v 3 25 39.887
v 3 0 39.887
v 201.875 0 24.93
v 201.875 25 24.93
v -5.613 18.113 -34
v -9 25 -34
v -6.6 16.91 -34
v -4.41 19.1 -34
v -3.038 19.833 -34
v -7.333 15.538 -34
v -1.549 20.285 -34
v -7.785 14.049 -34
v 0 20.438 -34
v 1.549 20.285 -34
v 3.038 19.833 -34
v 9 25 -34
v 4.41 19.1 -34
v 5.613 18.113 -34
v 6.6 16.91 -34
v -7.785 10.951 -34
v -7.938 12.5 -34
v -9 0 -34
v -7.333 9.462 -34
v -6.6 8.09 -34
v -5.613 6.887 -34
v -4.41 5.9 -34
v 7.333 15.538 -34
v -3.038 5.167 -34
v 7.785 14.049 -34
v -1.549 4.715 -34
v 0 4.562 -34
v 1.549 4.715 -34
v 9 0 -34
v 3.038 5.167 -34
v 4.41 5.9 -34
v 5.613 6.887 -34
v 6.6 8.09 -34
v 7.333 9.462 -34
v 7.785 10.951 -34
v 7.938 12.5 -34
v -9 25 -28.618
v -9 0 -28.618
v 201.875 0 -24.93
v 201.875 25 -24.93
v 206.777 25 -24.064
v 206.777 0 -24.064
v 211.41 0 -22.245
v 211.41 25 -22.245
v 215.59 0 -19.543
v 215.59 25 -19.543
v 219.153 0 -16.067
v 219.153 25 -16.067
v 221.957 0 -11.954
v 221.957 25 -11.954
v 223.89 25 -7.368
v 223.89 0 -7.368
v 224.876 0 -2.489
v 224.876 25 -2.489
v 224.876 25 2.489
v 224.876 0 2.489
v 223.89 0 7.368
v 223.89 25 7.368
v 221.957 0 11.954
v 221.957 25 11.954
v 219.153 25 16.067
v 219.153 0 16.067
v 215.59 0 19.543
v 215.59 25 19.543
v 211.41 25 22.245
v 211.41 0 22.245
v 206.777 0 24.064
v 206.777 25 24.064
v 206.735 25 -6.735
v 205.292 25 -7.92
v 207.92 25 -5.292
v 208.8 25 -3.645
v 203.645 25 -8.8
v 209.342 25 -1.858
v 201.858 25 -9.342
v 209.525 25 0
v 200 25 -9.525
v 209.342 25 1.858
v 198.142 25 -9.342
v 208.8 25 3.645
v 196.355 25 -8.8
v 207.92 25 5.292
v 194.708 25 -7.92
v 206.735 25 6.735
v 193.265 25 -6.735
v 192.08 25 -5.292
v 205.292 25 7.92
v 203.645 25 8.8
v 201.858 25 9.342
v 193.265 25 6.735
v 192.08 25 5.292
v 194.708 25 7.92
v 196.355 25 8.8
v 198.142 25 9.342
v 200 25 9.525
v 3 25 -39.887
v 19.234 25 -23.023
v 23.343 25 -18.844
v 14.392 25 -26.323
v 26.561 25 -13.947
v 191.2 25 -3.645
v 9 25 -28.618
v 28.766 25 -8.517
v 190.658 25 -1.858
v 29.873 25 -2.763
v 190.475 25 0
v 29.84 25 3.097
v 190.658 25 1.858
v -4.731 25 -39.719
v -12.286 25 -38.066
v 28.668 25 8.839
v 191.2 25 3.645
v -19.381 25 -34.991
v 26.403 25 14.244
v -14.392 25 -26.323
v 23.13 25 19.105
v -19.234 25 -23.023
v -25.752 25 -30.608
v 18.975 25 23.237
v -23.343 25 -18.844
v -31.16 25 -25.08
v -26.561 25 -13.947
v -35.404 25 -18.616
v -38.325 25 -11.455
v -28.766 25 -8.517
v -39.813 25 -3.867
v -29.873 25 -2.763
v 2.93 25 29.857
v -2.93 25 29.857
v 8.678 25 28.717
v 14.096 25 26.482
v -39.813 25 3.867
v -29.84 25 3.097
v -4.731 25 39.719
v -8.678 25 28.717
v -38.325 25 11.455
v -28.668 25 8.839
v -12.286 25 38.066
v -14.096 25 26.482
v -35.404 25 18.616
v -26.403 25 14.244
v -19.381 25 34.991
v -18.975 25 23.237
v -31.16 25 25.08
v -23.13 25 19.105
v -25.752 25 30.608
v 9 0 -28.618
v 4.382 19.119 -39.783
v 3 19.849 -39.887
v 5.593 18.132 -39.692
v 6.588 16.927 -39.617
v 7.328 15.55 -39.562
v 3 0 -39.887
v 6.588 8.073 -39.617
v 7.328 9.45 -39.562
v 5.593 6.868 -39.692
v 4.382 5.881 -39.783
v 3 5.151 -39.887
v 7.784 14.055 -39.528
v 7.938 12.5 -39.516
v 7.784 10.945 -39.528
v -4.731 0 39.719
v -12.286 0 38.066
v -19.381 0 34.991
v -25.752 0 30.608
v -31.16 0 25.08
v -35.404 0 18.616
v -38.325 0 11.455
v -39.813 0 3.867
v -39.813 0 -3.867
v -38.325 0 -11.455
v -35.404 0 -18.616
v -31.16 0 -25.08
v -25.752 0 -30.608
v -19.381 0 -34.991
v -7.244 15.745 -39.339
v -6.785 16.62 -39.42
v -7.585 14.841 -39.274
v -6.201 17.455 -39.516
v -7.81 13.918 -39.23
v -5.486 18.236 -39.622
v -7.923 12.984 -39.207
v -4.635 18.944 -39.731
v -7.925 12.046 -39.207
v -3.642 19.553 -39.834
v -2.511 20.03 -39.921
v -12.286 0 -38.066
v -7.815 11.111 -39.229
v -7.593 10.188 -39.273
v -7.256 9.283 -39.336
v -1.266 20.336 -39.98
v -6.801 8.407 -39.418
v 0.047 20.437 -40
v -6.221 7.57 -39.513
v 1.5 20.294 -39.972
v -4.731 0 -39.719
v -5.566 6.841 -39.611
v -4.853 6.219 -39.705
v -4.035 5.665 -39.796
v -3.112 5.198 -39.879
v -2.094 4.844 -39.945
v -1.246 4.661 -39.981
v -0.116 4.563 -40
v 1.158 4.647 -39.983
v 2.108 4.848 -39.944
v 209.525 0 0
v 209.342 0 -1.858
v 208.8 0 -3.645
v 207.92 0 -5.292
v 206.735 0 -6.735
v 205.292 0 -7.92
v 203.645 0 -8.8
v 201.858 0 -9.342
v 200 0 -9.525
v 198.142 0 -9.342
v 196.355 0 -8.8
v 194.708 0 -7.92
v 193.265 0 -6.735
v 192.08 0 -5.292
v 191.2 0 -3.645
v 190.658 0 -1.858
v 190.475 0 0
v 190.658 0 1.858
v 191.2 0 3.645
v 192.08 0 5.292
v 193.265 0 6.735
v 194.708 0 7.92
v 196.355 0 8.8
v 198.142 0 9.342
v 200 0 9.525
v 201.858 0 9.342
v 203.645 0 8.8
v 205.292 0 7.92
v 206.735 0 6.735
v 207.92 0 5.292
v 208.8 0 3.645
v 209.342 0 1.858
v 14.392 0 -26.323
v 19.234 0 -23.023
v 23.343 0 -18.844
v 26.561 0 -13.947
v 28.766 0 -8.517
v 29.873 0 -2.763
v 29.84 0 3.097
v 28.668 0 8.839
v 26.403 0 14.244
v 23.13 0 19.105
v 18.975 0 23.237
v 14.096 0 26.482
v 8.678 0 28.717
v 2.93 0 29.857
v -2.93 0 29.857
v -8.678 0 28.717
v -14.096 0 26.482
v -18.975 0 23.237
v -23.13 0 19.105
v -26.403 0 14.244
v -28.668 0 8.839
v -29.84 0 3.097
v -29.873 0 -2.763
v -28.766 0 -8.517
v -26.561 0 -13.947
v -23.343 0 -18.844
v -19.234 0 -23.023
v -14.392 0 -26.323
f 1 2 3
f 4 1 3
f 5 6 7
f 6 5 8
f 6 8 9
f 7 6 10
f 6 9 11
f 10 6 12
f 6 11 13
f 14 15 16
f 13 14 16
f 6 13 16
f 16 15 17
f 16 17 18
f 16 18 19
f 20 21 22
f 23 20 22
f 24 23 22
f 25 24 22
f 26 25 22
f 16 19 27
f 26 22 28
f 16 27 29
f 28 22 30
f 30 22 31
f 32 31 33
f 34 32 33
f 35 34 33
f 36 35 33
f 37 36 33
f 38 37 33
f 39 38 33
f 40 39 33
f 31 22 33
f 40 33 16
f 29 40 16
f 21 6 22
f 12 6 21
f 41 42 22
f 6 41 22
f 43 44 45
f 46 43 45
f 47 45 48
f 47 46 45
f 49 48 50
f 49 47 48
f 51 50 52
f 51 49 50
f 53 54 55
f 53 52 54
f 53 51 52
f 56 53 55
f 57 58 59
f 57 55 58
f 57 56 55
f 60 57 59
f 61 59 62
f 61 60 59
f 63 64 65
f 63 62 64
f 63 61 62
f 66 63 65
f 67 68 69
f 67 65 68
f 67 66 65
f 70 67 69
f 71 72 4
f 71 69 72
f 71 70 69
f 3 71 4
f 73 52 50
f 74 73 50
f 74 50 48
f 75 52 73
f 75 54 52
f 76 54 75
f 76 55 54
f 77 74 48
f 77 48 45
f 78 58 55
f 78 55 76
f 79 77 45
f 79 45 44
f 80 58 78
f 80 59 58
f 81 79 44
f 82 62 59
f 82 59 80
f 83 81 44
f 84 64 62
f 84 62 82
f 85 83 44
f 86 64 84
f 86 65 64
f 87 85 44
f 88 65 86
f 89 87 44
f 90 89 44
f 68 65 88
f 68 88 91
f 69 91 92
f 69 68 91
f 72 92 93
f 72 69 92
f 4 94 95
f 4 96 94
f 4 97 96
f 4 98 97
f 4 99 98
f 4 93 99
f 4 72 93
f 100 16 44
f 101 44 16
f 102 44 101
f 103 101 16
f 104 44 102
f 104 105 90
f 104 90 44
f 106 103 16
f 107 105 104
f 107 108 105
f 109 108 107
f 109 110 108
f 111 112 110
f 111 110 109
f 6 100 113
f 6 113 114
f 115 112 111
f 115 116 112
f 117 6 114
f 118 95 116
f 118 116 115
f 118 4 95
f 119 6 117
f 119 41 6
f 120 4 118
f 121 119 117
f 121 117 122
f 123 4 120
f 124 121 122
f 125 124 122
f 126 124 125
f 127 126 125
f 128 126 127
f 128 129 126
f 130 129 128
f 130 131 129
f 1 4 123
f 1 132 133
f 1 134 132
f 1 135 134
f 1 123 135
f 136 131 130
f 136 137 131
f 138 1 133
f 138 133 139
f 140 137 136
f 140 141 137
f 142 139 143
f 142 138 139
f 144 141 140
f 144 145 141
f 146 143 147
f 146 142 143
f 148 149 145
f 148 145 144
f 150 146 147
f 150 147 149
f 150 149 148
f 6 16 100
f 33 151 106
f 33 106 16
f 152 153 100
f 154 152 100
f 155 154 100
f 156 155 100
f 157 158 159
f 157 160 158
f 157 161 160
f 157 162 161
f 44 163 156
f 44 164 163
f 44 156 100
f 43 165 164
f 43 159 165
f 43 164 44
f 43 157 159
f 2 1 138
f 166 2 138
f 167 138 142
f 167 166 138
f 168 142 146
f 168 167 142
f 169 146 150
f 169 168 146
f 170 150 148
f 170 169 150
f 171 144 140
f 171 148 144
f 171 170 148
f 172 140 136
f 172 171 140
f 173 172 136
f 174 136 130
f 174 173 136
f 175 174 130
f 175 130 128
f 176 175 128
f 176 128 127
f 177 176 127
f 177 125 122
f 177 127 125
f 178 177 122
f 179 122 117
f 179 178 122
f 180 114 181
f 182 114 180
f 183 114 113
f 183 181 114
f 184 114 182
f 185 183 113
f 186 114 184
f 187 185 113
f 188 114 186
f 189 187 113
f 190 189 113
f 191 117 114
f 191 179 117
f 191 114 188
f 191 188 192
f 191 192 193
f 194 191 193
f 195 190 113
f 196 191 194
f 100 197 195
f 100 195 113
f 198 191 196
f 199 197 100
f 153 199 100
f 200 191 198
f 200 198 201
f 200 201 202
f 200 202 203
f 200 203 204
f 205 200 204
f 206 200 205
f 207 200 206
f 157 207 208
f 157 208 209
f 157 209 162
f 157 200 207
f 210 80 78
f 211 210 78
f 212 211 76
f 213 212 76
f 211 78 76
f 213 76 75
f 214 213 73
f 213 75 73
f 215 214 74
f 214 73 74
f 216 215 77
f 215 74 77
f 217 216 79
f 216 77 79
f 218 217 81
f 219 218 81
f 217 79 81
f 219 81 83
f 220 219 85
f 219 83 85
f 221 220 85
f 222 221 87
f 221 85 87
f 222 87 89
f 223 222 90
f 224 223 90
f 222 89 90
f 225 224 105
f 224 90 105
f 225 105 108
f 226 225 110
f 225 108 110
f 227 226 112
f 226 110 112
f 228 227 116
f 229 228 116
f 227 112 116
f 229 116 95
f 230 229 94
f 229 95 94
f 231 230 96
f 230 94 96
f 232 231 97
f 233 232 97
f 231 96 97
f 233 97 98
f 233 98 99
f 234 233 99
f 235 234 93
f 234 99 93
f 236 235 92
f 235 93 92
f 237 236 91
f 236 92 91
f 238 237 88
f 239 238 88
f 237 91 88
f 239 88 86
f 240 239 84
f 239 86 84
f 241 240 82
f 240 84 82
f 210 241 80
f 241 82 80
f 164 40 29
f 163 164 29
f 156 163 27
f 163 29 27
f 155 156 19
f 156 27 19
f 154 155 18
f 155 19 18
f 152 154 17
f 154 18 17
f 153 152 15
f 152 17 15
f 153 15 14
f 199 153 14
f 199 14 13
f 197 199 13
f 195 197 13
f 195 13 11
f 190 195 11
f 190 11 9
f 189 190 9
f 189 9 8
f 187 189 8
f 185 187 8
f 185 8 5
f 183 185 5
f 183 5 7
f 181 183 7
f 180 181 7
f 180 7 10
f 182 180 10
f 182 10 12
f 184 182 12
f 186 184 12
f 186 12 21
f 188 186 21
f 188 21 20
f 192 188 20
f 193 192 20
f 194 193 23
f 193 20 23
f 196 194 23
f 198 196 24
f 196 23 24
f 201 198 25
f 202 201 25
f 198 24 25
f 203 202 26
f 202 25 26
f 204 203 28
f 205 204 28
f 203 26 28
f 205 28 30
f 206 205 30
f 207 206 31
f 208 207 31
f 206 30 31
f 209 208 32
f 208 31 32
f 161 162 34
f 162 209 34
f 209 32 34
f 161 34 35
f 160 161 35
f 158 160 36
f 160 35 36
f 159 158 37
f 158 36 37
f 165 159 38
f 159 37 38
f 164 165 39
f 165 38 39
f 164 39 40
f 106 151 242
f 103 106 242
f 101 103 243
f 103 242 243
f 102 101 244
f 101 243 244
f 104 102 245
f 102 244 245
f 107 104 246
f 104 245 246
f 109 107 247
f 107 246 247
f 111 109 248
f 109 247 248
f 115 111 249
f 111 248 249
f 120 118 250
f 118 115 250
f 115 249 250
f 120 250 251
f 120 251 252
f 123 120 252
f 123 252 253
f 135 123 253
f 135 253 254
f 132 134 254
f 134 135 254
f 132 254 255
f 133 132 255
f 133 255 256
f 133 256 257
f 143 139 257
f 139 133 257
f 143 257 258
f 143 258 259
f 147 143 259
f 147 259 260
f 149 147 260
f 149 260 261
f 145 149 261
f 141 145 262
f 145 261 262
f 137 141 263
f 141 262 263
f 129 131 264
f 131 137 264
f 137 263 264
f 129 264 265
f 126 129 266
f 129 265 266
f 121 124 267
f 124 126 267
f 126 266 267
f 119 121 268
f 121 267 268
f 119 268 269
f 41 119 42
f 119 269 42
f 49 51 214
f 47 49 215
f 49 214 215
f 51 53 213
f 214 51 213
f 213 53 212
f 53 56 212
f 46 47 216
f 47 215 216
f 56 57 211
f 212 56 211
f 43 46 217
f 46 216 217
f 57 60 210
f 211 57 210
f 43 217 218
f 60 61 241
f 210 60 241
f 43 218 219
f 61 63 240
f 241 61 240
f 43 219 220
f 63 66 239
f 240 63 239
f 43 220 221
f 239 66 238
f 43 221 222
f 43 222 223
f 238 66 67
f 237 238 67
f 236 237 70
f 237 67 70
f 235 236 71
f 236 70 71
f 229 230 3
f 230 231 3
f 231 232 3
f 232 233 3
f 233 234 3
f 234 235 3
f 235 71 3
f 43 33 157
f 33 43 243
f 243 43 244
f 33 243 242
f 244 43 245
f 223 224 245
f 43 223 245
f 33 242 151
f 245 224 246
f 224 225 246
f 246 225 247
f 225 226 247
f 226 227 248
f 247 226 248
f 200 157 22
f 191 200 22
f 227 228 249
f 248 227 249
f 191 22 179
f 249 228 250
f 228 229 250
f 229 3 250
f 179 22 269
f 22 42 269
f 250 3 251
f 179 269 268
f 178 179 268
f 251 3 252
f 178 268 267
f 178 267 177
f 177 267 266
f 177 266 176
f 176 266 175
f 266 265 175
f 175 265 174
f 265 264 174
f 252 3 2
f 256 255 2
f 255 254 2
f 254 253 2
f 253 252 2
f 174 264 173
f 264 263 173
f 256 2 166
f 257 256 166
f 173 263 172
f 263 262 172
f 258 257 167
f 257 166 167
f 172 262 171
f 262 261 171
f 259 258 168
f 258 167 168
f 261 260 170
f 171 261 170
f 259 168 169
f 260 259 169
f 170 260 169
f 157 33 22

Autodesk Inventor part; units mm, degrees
ref_plane "YZ Plane" through (0, 0, 0) normal (1, 0, 0) x (0, 1, 0)
ref_plane "XZ Plane" through (0, 0, 0) normal (0, 1, 0) x (-1, 0, 0)
ref_plane "XY Plane" through (0, 0, 0) normal (0, 0, 1) x (1, 0, 0)
sketch "Sketch1" plane through (0, 0, 0) normal (0, 1, 0) x (-1, 0, 0)
  arc A0 (9, -28.6182) -> (-9, -28.6182) centre (0, 0) ccw
  arc A1 (-3, 39.8873) -> (-3, -39.8873) centre (0, 0) ccw construction
  line L0 (0, 0) -> (-200, 0) construction
  arc A2 (-175, 0) -> (-200, 25) centre (-200, 0) ccw construction
  line L1 (-200, 25) -> (-200, -25) construction
  line L2 (-3, -39.8873) -> (-201.875, -24.9296)
  line L3 (-3, 39.8873) -> (-201.875, 24.9296)
  arc A3 (-3, -39.8873) -> (-3, 39.8873) centre (0, 0) ccw
  arc A4 (-200, -25) -> (-175, 0) centre (-200, 0) ccw construction
  arc A5 (-200, 25) -> (-200, -25) centre (-200, 0) ccw
  line L4 (0, 0) -> (0, -30) construction
  line L5 (9, -23) -> (-9, -23) construction
  line L6 (9, -23) -> (9, -28.6182) construction
  line L7 (-9, -23) -> (-9, -28.6182) construction
  line L8 (9, -28.6182) -> (9, -34)
  line L9 (-9, -28.6182) -> (-9, -34)
  line L10 (9, -34) -> (-9, -34)
  arc A6 (0, -30) -> (9, -28.6182) centre (0, 0) ccw construction
  arc A7 (-9, -28.6182) -> (0, -30) centre (0, 0) ccw construction
  dimension "d0" = 60
  dimension "d1" = 80
  dimension "d2" = 200
  dimension "d3" = 50
  dimension "d5" = 18
  dimension "d6" = 7
  dimension "d7" = 4
extrude "Extrusion1" add sketch "Sketch1" along normal blind 25
sketch "Sketch2" plane through (0, 25, 0) normal (0, 1, 0) x (1, 0, 0)
  arc A0 (201.875, -24.9296) -> (201.875, 24.9296) centre (200, 0) ccw projected
  circle A1 centre (200, 0) radius 9.525
  point P0 (0, 0)
  dimension "d10" = 19.05
extrude "Extrusion4" cut sketch "Sketch2" against normal through all
sketch "Sketch4" plane through (-9, 0, -34) normal (0, 0, 1) x (1, 0, 0)
  line L0 (0, 0) -> (18, 0) projected
  line L1 (18, 0) -> (18, 25) projected
  line L2 (0, 25) -> (18, 25) projected
  line L3 (0, 0) -> (0, 25) projected
  line L4 (9, 25) -> (9, 0) construction
  line L5 (0, 0) -> (0, 25) construction
  line L6 (0, 12.5) -> (18, 12.5) construction
  circle A0 centre (9, 12.5) radius 7.9375
  dimension "d24" = 15.875
extrude "Extrusion5" cut sketch "Sketch4" against normal blind 10 contours A0
properties part number "placa manivela" material "Steel, Carbon"
